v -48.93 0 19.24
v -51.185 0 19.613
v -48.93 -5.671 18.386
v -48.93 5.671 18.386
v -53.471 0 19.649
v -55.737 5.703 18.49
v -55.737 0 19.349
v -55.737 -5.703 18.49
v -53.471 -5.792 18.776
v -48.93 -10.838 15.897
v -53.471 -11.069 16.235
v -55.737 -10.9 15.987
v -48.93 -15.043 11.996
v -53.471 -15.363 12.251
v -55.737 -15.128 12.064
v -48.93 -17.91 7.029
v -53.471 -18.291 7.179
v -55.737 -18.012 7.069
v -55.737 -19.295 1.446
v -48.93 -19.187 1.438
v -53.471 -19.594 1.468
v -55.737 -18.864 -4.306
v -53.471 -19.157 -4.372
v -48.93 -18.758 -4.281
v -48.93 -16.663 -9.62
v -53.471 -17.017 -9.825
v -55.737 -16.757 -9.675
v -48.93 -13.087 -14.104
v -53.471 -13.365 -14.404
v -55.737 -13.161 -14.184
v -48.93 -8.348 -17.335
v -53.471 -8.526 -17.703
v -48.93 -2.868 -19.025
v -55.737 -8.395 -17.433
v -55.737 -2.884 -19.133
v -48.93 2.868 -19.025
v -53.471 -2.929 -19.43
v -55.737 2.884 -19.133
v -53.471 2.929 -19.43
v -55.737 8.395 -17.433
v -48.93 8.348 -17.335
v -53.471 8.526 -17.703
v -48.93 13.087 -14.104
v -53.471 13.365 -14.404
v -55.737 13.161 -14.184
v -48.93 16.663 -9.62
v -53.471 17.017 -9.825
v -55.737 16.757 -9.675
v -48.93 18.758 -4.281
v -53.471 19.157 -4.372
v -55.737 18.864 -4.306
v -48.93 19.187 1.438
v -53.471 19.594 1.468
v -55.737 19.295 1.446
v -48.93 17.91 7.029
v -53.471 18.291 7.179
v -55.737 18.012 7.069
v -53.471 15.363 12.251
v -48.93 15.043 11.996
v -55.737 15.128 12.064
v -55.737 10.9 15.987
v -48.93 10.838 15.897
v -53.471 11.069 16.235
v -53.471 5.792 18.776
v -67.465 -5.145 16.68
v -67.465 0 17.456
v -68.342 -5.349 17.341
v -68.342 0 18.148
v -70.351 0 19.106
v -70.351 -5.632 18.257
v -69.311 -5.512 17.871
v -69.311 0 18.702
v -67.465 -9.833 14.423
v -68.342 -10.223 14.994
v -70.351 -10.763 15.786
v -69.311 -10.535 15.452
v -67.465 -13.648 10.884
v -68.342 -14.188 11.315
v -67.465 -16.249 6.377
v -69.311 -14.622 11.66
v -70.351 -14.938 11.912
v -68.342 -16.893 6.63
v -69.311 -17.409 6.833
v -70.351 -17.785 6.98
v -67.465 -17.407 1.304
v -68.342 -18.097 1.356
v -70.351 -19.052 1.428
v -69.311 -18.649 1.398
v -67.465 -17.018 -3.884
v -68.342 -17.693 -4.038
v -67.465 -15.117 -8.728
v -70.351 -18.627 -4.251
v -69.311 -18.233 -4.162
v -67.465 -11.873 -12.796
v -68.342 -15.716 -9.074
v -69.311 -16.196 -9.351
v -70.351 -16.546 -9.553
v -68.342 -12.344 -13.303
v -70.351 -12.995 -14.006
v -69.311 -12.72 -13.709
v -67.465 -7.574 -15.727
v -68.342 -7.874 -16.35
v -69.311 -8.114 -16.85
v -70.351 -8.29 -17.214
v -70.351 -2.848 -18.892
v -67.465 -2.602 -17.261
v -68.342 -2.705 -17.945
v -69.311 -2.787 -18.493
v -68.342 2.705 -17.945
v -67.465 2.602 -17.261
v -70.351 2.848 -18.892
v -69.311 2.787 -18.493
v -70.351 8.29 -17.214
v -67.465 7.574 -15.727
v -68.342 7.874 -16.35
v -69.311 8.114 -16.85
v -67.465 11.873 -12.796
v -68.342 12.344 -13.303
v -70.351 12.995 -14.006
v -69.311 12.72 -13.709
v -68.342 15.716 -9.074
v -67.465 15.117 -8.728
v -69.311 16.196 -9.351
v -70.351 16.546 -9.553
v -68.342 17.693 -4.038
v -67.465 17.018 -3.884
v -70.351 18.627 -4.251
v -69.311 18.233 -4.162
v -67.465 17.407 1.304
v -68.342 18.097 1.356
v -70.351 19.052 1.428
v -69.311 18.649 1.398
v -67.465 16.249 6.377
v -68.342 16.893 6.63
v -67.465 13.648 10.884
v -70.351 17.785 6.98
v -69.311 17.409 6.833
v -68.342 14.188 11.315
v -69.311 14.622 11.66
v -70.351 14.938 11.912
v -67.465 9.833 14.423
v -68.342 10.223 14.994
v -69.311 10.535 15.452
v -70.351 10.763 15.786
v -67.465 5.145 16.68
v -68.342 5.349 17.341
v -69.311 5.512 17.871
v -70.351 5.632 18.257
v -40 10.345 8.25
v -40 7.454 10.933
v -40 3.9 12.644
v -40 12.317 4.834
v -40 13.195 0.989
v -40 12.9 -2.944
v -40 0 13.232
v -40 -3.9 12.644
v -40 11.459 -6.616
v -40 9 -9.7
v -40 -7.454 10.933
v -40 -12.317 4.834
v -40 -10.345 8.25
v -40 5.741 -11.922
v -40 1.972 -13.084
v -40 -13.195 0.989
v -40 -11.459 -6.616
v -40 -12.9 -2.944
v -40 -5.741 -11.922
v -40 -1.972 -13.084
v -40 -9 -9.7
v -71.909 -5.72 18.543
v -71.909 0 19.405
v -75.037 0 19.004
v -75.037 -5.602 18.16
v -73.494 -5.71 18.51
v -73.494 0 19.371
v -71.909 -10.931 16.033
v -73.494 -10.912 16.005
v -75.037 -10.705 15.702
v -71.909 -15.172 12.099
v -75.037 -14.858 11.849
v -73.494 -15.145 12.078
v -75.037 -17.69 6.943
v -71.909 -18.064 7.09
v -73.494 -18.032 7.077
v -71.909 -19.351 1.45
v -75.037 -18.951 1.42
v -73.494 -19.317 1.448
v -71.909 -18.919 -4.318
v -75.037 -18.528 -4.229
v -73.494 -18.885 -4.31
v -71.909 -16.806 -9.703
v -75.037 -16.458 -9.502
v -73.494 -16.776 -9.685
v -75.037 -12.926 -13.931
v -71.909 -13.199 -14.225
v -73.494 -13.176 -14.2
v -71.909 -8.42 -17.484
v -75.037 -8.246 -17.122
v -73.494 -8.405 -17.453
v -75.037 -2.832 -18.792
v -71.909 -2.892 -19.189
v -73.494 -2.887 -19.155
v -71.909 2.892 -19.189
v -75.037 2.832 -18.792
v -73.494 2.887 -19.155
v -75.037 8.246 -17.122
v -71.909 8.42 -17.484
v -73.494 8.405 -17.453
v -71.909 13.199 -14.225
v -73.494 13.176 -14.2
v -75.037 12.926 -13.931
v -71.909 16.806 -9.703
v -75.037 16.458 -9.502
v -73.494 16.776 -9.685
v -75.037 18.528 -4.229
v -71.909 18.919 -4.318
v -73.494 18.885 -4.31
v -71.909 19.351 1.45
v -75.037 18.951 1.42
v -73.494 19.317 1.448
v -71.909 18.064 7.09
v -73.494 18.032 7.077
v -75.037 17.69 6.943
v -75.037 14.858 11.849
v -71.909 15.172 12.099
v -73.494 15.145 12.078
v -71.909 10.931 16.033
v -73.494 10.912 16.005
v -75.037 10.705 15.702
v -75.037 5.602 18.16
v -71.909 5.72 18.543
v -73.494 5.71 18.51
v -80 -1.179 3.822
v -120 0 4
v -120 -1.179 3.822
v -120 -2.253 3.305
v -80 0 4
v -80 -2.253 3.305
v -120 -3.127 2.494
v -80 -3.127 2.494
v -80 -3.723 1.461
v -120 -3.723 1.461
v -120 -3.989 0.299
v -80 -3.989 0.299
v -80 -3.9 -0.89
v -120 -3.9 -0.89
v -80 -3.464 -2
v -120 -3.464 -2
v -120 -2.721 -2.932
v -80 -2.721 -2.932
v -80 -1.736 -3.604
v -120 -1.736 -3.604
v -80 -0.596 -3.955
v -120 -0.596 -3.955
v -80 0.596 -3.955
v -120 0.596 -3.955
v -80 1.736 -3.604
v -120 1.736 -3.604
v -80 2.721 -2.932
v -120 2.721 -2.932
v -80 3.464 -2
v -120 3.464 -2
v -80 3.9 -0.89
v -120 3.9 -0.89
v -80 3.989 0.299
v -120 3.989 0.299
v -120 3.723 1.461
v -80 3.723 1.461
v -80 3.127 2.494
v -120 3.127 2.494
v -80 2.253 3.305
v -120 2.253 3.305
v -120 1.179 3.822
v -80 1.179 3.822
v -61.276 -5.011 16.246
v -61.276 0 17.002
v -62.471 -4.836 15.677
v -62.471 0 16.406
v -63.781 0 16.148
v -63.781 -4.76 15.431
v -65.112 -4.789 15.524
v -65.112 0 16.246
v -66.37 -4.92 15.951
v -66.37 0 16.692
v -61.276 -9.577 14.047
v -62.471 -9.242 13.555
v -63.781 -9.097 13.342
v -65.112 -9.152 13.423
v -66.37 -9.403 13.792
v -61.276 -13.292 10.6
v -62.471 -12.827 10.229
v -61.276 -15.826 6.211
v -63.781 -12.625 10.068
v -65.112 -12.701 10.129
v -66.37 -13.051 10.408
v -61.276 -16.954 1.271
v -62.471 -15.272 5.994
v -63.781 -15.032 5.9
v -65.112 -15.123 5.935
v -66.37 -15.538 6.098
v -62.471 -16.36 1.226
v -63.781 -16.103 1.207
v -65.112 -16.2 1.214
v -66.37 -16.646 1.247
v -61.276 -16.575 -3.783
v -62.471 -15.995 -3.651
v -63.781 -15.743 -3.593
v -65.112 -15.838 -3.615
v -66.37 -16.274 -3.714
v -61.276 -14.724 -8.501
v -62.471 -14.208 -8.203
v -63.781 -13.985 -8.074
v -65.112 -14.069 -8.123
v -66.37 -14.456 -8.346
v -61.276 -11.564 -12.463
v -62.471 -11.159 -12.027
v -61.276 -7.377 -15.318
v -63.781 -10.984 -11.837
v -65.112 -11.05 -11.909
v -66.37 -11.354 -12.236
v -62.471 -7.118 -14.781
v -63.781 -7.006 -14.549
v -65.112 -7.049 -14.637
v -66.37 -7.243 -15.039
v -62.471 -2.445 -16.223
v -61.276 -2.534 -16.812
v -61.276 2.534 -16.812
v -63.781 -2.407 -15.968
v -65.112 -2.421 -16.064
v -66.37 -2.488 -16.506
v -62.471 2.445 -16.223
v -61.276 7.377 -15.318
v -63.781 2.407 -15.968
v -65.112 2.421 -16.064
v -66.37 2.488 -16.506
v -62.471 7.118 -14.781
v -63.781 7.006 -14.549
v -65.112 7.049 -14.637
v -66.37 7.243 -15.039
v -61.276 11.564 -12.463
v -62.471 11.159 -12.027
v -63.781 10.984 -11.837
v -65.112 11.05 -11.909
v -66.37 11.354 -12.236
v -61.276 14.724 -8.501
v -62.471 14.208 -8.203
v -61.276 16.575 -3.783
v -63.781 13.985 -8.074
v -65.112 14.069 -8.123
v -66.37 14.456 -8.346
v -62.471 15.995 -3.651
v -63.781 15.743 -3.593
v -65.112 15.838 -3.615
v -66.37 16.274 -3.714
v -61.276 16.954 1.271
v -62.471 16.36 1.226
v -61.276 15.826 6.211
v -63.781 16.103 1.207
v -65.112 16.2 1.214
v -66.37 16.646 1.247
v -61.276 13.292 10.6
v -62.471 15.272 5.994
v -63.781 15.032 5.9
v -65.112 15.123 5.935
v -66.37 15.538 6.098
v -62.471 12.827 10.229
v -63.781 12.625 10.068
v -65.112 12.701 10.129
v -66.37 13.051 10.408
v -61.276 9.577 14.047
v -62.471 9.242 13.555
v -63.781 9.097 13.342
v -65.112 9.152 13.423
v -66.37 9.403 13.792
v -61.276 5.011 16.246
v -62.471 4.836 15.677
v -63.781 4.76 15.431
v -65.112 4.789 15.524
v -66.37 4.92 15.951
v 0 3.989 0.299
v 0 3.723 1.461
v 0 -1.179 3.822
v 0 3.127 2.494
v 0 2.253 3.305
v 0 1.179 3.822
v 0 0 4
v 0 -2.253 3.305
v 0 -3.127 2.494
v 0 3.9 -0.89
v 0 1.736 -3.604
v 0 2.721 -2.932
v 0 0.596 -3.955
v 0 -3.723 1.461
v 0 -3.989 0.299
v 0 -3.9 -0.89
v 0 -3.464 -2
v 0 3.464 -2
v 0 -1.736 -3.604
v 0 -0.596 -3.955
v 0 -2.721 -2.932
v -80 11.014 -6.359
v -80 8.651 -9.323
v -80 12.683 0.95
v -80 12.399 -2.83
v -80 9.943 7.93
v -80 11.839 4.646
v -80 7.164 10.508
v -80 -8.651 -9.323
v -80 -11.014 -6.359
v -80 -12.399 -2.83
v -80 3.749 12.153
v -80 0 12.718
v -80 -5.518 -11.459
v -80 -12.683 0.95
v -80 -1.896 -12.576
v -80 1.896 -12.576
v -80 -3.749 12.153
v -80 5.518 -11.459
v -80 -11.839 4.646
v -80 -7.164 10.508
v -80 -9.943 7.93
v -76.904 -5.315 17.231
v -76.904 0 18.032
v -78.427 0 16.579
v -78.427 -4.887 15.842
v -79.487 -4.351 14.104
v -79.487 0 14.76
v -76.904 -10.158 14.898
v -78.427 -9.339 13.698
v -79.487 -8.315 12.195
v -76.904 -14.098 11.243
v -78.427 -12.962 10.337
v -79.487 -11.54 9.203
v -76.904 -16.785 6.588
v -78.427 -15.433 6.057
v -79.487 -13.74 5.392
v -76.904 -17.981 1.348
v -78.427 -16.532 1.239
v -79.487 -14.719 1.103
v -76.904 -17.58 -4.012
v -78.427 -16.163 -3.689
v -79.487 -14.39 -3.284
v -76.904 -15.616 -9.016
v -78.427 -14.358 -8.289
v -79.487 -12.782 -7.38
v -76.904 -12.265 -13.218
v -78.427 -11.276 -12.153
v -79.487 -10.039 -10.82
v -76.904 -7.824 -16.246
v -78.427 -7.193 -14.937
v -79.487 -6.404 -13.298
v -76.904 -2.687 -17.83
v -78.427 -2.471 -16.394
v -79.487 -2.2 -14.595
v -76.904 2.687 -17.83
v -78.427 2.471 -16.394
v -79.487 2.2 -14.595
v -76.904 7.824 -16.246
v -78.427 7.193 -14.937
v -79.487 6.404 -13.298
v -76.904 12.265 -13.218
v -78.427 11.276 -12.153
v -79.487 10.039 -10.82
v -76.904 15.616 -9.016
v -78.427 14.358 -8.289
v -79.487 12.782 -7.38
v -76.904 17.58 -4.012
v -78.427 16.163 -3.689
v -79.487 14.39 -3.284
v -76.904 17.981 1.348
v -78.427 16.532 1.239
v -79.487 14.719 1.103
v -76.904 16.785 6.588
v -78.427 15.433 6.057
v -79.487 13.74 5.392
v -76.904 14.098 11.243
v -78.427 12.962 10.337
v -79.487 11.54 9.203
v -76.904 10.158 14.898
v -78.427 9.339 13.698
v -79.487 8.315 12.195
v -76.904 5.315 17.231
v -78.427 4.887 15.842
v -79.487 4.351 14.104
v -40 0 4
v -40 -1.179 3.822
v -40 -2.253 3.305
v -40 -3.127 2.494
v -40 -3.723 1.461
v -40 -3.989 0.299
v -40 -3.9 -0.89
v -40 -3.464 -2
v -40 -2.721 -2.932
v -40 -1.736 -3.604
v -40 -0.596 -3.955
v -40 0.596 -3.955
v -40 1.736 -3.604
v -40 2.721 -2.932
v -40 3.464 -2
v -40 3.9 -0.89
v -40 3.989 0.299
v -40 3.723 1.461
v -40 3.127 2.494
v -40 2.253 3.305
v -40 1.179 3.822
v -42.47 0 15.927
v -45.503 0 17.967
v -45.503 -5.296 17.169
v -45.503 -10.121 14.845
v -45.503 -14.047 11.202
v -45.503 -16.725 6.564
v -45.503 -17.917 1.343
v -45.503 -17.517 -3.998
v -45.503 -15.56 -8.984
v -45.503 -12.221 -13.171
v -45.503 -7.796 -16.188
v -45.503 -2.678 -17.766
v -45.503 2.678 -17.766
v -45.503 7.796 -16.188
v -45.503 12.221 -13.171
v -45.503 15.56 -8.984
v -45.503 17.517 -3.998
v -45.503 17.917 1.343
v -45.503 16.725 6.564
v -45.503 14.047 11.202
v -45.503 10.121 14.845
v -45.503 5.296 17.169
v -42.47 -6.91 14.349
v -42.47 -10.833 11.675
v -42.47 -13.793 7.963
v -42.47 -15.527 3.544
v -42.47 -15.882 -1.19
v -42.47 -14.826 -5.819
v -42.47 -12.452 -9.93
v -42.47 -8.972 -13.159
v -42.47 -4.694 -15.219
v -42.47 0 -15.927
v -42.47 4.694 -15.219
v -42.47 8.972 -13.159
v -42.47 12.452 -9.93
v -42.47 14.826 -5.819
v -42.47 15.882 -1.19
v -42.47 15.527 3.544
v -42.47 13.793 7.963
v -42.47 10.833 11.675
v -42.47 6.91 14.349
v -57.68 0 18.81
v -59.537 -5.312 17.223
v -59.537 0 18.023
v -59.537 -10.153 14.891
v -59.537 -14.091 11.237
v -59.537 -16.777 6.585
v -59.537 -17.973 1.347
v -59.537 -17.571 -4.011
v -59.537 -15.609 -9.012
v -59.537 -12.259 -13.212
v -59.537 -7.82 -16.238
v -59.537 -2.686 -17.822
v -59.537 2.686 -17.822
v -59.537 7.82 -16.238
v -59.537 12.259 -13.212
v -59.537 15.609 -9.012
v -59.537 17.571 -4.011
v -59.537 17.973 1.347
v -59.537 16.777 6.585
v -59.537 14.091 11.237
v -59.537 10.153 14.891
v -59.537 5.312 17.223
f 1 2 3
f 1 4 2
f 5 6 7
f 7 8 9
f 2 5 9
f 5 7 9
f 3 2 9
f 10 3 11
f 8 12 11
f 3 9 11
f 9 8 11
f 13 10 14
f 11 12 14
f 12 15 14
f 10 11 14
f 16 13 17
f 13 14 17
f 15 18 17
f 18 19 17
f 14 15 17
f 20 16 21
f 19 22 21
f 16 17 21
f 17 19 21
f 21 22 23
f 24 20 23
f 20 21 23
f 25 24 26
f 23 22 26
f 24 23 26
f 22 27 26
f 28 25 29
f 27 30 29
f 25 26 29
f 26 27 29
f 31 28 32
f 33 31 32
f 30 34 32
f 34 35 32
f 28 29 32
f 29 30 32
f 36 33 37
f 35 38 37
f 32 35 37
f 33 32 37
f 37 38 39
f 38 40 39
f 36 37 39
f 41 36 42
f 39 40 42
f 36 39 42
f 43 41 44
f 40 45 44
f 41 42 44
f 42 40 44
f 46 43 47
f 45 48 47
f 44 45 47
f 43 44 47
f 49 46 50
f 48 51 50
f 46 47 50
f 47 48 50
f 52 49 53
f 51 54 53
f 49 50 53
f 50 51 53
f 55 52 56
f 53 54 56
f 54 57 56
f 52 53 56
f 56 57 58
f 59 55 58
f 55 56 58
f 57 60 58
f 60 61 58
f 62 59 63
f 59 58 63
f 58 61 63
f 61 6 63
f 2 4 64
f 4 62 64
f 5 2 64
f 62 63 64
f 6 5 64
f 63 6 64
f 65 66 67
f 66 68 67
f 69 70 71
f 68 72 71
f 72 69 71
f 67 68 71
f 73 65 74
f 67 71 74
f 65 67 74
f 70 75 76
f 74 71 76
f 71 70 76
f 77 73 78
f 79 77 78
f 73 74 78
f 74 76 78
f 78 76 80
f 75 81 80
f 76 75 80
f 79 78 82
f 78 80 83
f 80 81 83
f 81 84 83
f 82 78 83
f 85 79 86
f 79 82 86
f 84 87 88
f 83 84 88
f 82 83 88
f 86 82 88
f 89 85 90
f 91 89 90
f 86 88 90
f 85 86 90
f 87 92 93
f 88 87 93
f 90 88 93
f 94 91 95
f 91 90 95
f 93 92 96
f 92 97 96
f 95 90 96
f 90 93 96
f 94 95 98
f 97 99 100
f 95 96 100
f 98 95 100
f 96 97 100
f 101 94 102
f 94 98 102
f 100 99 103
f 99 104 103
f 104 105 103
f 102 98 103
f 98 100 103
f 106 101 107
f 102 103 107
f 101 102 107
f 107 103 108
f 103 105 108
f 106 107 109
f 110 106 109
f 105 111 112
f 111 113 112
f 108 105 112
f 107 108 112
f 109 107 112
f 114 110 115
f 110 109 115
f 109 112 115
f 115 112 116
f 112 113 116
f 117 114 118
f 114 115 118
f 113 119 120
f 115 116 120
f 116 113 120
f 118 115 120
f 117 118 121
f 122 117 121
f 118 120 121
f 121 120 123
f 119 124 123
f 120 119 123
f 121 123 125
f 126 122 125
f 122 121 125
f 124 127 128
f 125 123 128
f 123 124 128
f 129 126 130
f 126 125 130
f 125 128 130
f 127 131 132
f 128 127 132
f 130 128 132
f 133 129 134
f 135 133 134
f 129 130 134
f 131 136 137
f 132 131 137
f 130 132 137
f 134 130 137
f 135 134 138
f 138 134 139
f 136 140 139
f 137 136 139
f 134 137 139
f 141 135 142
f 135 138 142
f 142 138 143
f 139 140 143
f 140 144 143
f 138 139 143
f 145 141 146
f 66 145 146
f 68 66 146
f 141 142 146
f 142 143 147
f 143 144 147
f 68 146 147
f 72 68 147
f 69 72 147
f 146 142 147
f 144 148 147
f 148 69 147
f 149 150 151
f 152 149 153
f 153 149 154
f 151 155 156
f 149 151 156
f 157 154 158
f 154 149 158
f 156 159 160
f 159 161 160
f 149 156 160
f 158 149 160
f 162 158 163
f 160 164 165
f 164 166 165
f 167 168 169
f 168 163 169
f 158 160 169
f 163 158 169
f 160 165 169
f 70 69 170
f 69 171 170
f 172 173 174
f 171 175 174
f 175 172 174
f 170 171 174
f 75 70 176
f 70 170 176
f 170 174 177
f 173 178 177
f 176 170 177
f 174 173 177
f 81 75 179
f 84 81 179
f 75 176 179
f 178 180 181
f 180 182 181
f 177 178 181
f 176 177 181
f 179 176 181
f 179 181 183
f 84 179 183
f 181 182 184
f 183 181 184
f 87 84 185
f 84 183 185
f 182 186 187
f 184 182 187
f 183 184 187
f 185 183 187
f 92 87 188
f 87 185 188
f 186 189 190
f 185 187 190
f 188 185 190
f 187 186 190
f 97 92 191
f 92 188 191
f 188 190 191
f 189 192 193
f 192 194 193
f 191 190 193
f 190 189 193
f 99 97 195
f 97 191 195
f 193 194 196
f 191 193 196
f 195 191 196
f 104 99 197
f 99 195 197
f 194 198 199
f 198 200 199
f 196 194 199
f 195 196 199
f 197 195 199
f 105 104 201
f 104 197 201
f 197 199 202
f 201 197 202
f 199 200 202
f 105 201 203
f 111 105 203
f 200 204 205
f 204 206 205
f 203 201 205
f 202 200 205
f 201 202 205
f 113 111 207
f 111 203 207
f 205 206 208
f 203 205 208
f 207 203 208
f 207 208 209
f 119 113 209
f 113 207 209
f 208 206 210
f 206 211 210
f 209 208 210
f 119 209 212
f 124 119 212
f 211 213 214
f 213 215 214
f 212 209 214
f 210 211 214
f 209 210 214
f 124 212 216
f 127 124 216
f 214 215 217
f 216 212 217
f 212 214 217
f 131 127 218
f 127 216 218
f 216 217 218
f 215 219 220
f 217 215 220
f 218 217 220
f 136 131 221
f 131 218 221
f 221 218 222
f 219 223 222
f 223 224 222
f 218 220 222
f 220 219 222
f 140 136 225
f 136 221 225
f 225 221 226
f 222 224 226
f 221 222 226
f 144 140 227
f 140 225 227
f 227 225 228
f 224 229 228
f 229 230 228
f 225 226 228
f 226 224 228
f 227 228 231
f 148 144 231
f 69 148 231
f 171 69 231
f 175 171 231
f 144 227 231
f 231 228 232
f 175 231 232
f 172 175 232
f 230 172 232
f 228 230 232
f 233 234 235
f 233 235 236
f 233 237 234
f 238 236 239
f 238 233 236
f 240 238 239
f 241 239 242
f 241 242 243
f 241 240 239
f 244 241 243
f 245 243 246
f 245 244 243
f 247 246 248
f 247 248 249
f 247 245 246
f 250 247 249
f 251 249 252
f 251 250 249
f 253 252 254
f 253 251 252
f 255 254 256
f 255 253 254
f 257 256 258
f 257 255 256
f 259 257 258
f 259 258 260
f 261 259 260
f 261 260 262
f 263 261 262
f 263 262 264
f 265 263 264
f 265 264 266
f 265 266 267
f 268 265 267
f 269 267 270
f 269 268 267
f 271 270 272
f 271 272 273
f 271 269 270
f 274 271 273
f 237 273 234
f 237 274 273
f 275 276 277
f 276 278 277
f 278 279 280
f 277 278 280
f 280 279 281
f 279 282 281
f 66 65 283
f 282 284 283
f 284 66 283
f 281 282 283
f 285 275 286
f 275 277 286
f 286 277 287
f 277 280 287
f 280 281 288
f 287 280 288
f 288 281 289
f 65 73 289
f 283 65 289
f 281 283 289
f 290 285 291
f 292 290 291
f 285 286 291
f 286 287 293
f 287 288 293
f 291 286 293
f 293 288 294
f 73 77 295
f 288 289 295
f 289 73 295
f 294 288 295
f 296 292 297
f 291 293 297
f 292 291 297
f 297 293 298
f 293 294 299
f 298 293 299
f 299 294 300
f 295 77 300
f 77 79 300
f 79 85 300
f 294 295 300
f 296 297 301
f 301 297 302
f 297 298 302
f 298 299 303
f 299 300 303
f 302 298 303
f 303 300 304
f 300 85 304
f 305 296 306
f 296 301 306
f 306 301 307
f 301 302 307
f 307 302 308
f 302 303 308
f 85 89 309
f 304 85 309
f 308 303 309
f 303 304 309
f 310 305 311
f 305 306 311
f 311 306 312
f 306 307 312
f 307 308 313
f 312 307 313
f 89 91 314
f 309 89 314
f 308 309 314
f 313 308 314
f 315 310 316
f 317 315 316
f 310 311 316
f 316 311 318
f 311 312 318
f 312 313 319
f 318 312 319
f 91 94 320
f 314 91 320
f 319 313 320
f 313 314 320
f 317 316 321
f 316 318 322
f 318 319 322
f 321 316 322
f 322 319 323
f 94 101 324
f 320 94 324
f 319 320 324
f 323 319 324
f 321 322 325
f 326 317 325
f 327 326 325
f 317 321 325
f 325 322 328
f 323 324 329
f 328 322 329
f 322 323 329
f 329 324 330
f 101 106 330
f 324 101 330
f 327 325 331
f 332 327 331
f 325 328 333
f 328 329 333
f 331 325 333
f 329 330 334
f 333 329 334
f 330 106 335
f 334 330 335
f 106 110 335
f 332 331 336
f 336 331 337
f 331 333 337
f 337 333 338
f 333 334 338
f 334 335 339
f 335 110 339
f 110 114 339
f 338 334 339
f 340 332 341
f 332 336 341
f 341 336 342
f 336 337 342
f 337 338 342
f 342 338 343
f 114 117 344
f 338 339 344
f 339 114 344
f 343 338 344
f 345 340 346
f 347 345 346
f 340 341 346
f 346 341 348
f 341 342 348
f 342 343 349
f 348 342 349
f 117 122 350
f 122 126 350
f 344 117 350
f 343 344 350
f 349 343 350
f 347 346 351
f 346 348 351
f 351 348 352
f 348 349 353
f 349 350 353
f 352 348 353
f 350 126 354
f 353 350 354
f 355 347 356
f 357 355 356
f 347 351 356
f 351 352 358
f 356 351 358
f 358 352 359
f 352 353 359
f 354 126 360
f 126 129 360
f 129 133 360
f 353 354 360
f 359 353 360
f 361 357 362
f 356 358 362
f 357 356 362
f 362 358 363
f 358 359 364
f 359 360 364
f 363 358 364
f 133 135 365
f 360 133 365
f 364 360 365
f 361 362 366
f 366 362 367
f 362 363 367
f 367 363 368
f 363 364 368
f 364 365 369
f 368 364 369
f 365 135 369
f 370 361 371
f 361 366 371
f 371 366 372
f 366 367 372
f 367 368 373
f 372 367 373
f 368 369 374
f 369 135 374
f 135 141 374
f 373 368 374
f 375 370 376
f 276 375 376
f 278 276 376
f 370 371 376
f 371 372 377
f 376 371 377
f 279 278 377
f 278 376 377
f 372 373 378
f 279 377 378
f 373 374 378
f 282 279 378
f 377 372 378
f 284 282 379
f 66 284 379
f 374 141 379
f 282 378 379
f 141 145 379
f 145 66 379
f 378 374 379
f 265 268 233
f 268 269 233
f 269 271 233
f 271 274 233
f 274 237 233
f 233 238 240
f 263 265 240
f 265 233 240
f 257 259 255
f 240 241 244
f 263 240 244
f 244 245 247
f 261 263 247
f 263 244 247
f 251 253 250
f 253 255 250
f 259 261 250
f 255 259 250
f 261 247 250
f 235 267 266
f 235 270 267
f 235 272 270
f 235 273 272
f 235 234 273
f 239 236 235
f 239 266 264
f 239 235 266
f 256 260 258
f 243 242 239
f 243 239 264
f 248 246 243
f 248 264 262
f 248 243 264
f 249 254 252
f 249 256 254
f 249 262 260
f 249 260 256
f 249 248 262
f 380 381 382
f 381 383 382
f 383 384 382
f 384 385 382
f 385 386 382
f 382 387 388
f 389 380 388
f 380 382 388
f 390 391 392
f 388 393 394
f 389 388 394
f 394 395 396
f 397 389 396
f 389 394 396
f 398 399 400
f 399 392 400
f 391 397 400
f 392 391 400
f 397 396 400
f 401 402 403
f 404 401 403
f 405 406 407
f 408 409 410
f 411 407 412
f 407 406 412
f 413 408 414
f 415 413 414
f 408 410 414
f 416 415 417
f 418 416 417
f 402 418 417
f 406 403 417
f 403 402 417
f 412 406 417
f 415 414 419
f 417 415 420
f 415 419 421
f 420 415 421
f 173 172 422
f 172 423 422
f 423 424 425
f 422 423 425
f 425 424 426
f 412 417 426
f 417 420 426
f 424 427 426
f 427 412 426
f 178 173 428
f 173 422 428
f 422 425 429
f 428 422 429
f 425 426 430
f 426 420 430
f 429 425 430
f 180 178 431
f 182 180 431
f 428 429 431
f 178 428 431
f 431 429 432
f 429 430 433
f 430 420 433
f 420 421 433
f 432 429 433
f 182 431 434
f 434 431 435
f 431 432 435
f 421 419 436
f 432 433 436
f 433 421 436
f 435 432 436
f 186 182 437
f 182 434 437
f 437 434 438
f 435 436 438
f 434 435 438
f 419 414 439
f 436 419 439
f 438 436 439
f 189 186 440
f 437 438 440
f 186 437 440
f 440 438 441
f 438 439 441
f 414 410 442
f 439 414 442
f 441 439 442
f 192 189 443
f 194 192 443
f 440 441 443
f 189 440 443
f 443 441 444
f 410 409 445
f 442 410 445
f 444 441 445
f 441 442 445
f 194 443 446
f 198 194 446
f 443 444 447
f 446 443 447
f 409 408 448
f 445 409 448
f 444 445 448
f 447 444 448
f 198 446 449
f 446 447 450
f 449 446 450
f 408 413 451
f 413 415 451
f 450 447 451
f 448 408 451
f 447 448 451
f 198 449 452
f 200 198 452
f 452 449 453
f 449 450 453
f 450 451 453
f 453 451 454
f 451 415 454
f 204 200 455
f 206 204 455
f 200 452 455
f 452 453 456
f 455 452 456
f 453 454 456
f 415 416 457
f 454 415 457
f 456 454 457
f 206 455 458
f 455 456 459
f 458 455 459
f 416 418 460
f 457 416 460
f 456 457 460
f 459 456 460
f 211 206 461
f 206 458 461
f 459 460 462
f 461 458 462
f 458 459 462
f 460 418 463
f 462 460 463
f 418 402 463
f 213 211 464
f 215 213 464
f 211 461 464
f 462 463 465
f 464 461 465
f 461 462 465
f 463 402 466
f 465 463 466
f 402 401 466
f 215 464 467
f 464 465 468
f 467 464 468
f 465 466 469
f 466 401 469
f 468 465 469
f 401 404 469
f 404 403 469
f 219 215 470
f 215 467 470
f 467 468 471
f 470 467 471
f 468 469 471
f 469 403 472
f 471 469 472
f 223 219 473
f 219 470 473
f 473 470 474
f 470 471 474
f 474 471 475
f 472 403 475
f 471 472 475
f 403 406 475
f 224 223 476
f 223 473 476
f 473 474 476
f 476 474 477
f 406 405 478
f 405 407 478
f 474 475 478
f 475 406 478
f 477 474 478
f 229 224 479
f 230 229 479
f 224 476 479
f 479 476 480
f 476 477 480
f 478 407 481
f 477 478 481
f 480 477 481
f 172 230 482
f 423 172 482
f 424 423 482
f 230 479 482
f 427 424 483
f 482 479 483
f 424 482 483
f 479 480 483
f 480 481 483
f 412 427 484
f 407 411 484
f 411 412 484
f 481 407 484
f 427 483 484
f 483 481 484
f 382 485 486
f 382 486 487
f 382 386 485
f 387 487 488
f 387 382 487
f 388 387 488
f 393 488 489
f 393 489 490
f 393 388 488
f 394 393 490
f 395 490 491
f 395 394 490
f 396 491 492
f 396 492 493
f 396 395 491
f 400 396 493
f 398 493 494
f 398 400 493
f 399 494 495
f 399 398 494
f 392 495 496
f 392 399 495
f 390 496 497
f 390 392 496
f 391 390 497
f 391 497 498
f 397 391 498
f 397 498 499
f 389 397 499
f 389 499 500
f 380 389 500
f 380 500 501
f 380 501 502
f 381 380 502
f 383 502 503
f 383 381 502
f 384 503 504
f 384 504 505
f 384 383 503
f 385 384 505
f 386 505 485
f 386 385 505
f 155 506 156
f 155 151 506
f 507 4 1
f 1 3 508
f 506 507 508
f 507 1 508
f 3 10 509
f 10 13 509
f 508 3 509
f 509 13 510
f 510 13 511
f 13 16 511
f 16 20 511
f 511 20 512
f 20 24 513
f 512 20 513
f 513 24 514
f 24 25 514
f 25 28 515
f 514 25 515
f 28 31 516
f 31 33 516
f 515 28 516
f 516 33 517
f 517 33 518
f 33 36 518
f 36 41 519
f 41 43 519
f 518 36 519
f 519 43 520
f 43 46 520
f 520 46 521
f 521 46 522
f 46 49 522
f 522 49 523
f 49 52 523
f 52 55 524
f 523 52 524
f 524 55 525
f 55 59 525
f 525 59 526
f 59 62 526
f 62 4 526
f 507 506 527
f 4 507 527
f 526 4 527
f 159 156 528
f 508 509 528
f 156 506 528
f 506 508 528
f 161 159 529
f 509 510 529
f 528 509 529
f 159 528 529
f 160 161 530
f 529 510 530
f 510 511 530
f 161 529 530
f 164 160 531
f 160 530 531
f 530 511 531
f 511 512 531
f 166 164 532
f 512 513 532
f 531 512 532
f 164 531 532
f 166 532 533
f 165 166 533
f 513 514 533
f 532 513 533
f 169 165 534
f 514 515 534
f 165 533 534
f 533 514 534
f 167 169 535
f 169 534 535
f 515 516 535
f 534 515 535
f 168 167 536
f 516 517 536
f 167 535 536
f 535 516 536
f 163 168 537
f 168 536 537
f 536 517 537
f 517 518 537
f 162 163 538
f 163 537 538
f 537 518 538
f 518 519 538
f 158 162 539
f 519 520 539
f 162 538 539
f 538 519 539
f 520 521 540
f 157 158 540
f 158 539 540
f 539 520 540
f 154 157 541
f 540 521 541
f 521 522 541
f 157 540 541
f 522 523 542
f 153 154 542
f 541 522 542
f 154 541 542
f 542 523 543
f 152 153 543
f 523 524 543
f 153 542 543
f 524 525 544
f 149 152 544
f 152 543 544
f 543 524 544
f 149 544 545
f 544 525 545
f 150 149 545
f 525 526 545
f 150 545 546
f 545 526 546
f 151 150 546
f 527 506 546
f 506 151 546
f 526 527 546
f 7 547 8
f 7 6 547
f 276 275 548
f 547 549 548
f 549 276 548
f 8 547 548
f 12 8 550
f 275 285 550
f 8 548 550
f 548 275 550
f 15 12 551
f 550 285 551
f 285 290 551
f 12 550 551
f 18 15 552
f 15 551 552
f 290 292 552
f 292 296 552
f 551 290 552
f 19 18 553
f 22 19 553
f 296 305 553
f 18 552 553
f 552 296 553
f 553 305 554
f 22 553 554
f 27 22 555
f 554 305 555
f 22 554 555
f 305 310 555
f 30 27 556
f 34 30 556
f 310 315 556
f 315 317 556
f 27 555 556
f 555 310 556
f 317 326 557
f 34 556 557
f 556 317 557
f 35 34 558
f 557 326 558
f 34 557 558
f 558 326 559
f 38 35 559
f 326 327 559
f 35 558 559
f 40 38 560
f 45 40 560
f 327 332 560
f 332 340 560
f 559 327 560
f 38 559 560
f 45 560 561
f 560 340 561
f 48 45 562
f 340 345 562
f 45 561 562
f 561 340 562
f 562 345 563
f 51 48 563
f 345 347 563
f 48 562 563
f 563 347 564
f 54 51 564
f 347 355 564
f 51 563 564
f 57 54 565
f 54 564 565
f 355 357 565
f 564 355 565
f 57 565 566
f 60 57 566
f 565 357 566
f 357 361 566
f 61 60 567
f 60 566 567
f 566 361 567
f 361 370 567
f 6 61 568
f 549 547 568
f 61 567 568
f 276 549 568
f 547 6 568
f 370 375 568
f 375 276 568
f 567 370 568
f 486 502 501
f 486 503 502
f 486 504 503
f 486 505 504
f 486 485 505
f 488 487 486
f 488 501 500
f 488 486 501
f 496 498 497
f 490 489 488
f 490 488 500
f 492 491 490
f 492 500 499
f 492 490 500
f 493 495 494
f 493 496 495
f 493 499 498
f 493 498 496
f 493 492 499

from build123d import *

# Parameters (mm, degrees)
F0_W = 40
F0_H = 4


# Not quite as in the source:
# - a feature names something its author has since deleted; it is built from what else it names
# - the program builds the solid bodies; features that only make, move or delete a surface that nothing else refers to are left out


with BuildPart() as f1:
    # F0 (on Front) → F1 (revolve)
    with BuildSketch(Plane.XZ):
        with Locations((-60, 2)):
            Rectangle(F0_W, F0_H)
        with BuildLine():
            Line((-80, 12.7181895077), (-80, 4))
            Line((-80, 4), (-40, 4))
            Line((-40, 4), (-40, 13.2320560515))
            ThreePointArc((-40, 13.2320560515), (-43.9265726053, 17.0365837136), (-48.9301517038, 19.2403530667))
            ThreePointArc((-48.9301517038, 19.2403530667), (-52.3273584241, 19.6733006707), (-55.7366863479, 19.3493558663))
            ThreePointArc((-55.7366863479, 19.3493558663), (-58.6213477942, 18.4469810503), (-61.2759213851, 17.0017160163))
            ThreePointArc((-61.2759213851, 17.0017160163), (-64.4496036892, 16.152321931), (-67.4653046291, 17.4558853242))
            ThreePointArc((-67.4653046291, 17.4558853242), (-68.8158438678, 18.4427526295), (-70.3514725459, 19.1058573548))
            ThreePointArc((-70.3514725459, 19.1058573548), (-72.7023195146, 19.4301712071), (-75.0368519562, 19.0040031361))
            ThreePointArc((-75.0368519562, 19.0040031361), (-78.4273812016, 16.5787885104), (-80, 12.7181895077))
        make_face()
    revolve(axis=Axis((-60, 0, 0), (1, 0, 0)))


with BuildPart() as f2:
    # F0 (on Front) → F2 (revolve)
    with BuildSketch(Plane.XZ):
        with Locations((-100, 2)):
            Rectangle(F0_W, F0_H)
    revolve(axis=Axis((-60, 0, 0), (1, 0, 0)))


with BuildPart() as f2b:
    # F0 (on Front) → F2, piece 2 (revolve)
    with BuildSketch(Plane.XZ):
        with Locations((-20, 2)):
            Rectangle(F0_W, F0_H)
    revolve(axis=Axis((-60, 0, 0), (1, 0, 0)))


solid = Compound([f1.part, f2.part, f2b.part])
